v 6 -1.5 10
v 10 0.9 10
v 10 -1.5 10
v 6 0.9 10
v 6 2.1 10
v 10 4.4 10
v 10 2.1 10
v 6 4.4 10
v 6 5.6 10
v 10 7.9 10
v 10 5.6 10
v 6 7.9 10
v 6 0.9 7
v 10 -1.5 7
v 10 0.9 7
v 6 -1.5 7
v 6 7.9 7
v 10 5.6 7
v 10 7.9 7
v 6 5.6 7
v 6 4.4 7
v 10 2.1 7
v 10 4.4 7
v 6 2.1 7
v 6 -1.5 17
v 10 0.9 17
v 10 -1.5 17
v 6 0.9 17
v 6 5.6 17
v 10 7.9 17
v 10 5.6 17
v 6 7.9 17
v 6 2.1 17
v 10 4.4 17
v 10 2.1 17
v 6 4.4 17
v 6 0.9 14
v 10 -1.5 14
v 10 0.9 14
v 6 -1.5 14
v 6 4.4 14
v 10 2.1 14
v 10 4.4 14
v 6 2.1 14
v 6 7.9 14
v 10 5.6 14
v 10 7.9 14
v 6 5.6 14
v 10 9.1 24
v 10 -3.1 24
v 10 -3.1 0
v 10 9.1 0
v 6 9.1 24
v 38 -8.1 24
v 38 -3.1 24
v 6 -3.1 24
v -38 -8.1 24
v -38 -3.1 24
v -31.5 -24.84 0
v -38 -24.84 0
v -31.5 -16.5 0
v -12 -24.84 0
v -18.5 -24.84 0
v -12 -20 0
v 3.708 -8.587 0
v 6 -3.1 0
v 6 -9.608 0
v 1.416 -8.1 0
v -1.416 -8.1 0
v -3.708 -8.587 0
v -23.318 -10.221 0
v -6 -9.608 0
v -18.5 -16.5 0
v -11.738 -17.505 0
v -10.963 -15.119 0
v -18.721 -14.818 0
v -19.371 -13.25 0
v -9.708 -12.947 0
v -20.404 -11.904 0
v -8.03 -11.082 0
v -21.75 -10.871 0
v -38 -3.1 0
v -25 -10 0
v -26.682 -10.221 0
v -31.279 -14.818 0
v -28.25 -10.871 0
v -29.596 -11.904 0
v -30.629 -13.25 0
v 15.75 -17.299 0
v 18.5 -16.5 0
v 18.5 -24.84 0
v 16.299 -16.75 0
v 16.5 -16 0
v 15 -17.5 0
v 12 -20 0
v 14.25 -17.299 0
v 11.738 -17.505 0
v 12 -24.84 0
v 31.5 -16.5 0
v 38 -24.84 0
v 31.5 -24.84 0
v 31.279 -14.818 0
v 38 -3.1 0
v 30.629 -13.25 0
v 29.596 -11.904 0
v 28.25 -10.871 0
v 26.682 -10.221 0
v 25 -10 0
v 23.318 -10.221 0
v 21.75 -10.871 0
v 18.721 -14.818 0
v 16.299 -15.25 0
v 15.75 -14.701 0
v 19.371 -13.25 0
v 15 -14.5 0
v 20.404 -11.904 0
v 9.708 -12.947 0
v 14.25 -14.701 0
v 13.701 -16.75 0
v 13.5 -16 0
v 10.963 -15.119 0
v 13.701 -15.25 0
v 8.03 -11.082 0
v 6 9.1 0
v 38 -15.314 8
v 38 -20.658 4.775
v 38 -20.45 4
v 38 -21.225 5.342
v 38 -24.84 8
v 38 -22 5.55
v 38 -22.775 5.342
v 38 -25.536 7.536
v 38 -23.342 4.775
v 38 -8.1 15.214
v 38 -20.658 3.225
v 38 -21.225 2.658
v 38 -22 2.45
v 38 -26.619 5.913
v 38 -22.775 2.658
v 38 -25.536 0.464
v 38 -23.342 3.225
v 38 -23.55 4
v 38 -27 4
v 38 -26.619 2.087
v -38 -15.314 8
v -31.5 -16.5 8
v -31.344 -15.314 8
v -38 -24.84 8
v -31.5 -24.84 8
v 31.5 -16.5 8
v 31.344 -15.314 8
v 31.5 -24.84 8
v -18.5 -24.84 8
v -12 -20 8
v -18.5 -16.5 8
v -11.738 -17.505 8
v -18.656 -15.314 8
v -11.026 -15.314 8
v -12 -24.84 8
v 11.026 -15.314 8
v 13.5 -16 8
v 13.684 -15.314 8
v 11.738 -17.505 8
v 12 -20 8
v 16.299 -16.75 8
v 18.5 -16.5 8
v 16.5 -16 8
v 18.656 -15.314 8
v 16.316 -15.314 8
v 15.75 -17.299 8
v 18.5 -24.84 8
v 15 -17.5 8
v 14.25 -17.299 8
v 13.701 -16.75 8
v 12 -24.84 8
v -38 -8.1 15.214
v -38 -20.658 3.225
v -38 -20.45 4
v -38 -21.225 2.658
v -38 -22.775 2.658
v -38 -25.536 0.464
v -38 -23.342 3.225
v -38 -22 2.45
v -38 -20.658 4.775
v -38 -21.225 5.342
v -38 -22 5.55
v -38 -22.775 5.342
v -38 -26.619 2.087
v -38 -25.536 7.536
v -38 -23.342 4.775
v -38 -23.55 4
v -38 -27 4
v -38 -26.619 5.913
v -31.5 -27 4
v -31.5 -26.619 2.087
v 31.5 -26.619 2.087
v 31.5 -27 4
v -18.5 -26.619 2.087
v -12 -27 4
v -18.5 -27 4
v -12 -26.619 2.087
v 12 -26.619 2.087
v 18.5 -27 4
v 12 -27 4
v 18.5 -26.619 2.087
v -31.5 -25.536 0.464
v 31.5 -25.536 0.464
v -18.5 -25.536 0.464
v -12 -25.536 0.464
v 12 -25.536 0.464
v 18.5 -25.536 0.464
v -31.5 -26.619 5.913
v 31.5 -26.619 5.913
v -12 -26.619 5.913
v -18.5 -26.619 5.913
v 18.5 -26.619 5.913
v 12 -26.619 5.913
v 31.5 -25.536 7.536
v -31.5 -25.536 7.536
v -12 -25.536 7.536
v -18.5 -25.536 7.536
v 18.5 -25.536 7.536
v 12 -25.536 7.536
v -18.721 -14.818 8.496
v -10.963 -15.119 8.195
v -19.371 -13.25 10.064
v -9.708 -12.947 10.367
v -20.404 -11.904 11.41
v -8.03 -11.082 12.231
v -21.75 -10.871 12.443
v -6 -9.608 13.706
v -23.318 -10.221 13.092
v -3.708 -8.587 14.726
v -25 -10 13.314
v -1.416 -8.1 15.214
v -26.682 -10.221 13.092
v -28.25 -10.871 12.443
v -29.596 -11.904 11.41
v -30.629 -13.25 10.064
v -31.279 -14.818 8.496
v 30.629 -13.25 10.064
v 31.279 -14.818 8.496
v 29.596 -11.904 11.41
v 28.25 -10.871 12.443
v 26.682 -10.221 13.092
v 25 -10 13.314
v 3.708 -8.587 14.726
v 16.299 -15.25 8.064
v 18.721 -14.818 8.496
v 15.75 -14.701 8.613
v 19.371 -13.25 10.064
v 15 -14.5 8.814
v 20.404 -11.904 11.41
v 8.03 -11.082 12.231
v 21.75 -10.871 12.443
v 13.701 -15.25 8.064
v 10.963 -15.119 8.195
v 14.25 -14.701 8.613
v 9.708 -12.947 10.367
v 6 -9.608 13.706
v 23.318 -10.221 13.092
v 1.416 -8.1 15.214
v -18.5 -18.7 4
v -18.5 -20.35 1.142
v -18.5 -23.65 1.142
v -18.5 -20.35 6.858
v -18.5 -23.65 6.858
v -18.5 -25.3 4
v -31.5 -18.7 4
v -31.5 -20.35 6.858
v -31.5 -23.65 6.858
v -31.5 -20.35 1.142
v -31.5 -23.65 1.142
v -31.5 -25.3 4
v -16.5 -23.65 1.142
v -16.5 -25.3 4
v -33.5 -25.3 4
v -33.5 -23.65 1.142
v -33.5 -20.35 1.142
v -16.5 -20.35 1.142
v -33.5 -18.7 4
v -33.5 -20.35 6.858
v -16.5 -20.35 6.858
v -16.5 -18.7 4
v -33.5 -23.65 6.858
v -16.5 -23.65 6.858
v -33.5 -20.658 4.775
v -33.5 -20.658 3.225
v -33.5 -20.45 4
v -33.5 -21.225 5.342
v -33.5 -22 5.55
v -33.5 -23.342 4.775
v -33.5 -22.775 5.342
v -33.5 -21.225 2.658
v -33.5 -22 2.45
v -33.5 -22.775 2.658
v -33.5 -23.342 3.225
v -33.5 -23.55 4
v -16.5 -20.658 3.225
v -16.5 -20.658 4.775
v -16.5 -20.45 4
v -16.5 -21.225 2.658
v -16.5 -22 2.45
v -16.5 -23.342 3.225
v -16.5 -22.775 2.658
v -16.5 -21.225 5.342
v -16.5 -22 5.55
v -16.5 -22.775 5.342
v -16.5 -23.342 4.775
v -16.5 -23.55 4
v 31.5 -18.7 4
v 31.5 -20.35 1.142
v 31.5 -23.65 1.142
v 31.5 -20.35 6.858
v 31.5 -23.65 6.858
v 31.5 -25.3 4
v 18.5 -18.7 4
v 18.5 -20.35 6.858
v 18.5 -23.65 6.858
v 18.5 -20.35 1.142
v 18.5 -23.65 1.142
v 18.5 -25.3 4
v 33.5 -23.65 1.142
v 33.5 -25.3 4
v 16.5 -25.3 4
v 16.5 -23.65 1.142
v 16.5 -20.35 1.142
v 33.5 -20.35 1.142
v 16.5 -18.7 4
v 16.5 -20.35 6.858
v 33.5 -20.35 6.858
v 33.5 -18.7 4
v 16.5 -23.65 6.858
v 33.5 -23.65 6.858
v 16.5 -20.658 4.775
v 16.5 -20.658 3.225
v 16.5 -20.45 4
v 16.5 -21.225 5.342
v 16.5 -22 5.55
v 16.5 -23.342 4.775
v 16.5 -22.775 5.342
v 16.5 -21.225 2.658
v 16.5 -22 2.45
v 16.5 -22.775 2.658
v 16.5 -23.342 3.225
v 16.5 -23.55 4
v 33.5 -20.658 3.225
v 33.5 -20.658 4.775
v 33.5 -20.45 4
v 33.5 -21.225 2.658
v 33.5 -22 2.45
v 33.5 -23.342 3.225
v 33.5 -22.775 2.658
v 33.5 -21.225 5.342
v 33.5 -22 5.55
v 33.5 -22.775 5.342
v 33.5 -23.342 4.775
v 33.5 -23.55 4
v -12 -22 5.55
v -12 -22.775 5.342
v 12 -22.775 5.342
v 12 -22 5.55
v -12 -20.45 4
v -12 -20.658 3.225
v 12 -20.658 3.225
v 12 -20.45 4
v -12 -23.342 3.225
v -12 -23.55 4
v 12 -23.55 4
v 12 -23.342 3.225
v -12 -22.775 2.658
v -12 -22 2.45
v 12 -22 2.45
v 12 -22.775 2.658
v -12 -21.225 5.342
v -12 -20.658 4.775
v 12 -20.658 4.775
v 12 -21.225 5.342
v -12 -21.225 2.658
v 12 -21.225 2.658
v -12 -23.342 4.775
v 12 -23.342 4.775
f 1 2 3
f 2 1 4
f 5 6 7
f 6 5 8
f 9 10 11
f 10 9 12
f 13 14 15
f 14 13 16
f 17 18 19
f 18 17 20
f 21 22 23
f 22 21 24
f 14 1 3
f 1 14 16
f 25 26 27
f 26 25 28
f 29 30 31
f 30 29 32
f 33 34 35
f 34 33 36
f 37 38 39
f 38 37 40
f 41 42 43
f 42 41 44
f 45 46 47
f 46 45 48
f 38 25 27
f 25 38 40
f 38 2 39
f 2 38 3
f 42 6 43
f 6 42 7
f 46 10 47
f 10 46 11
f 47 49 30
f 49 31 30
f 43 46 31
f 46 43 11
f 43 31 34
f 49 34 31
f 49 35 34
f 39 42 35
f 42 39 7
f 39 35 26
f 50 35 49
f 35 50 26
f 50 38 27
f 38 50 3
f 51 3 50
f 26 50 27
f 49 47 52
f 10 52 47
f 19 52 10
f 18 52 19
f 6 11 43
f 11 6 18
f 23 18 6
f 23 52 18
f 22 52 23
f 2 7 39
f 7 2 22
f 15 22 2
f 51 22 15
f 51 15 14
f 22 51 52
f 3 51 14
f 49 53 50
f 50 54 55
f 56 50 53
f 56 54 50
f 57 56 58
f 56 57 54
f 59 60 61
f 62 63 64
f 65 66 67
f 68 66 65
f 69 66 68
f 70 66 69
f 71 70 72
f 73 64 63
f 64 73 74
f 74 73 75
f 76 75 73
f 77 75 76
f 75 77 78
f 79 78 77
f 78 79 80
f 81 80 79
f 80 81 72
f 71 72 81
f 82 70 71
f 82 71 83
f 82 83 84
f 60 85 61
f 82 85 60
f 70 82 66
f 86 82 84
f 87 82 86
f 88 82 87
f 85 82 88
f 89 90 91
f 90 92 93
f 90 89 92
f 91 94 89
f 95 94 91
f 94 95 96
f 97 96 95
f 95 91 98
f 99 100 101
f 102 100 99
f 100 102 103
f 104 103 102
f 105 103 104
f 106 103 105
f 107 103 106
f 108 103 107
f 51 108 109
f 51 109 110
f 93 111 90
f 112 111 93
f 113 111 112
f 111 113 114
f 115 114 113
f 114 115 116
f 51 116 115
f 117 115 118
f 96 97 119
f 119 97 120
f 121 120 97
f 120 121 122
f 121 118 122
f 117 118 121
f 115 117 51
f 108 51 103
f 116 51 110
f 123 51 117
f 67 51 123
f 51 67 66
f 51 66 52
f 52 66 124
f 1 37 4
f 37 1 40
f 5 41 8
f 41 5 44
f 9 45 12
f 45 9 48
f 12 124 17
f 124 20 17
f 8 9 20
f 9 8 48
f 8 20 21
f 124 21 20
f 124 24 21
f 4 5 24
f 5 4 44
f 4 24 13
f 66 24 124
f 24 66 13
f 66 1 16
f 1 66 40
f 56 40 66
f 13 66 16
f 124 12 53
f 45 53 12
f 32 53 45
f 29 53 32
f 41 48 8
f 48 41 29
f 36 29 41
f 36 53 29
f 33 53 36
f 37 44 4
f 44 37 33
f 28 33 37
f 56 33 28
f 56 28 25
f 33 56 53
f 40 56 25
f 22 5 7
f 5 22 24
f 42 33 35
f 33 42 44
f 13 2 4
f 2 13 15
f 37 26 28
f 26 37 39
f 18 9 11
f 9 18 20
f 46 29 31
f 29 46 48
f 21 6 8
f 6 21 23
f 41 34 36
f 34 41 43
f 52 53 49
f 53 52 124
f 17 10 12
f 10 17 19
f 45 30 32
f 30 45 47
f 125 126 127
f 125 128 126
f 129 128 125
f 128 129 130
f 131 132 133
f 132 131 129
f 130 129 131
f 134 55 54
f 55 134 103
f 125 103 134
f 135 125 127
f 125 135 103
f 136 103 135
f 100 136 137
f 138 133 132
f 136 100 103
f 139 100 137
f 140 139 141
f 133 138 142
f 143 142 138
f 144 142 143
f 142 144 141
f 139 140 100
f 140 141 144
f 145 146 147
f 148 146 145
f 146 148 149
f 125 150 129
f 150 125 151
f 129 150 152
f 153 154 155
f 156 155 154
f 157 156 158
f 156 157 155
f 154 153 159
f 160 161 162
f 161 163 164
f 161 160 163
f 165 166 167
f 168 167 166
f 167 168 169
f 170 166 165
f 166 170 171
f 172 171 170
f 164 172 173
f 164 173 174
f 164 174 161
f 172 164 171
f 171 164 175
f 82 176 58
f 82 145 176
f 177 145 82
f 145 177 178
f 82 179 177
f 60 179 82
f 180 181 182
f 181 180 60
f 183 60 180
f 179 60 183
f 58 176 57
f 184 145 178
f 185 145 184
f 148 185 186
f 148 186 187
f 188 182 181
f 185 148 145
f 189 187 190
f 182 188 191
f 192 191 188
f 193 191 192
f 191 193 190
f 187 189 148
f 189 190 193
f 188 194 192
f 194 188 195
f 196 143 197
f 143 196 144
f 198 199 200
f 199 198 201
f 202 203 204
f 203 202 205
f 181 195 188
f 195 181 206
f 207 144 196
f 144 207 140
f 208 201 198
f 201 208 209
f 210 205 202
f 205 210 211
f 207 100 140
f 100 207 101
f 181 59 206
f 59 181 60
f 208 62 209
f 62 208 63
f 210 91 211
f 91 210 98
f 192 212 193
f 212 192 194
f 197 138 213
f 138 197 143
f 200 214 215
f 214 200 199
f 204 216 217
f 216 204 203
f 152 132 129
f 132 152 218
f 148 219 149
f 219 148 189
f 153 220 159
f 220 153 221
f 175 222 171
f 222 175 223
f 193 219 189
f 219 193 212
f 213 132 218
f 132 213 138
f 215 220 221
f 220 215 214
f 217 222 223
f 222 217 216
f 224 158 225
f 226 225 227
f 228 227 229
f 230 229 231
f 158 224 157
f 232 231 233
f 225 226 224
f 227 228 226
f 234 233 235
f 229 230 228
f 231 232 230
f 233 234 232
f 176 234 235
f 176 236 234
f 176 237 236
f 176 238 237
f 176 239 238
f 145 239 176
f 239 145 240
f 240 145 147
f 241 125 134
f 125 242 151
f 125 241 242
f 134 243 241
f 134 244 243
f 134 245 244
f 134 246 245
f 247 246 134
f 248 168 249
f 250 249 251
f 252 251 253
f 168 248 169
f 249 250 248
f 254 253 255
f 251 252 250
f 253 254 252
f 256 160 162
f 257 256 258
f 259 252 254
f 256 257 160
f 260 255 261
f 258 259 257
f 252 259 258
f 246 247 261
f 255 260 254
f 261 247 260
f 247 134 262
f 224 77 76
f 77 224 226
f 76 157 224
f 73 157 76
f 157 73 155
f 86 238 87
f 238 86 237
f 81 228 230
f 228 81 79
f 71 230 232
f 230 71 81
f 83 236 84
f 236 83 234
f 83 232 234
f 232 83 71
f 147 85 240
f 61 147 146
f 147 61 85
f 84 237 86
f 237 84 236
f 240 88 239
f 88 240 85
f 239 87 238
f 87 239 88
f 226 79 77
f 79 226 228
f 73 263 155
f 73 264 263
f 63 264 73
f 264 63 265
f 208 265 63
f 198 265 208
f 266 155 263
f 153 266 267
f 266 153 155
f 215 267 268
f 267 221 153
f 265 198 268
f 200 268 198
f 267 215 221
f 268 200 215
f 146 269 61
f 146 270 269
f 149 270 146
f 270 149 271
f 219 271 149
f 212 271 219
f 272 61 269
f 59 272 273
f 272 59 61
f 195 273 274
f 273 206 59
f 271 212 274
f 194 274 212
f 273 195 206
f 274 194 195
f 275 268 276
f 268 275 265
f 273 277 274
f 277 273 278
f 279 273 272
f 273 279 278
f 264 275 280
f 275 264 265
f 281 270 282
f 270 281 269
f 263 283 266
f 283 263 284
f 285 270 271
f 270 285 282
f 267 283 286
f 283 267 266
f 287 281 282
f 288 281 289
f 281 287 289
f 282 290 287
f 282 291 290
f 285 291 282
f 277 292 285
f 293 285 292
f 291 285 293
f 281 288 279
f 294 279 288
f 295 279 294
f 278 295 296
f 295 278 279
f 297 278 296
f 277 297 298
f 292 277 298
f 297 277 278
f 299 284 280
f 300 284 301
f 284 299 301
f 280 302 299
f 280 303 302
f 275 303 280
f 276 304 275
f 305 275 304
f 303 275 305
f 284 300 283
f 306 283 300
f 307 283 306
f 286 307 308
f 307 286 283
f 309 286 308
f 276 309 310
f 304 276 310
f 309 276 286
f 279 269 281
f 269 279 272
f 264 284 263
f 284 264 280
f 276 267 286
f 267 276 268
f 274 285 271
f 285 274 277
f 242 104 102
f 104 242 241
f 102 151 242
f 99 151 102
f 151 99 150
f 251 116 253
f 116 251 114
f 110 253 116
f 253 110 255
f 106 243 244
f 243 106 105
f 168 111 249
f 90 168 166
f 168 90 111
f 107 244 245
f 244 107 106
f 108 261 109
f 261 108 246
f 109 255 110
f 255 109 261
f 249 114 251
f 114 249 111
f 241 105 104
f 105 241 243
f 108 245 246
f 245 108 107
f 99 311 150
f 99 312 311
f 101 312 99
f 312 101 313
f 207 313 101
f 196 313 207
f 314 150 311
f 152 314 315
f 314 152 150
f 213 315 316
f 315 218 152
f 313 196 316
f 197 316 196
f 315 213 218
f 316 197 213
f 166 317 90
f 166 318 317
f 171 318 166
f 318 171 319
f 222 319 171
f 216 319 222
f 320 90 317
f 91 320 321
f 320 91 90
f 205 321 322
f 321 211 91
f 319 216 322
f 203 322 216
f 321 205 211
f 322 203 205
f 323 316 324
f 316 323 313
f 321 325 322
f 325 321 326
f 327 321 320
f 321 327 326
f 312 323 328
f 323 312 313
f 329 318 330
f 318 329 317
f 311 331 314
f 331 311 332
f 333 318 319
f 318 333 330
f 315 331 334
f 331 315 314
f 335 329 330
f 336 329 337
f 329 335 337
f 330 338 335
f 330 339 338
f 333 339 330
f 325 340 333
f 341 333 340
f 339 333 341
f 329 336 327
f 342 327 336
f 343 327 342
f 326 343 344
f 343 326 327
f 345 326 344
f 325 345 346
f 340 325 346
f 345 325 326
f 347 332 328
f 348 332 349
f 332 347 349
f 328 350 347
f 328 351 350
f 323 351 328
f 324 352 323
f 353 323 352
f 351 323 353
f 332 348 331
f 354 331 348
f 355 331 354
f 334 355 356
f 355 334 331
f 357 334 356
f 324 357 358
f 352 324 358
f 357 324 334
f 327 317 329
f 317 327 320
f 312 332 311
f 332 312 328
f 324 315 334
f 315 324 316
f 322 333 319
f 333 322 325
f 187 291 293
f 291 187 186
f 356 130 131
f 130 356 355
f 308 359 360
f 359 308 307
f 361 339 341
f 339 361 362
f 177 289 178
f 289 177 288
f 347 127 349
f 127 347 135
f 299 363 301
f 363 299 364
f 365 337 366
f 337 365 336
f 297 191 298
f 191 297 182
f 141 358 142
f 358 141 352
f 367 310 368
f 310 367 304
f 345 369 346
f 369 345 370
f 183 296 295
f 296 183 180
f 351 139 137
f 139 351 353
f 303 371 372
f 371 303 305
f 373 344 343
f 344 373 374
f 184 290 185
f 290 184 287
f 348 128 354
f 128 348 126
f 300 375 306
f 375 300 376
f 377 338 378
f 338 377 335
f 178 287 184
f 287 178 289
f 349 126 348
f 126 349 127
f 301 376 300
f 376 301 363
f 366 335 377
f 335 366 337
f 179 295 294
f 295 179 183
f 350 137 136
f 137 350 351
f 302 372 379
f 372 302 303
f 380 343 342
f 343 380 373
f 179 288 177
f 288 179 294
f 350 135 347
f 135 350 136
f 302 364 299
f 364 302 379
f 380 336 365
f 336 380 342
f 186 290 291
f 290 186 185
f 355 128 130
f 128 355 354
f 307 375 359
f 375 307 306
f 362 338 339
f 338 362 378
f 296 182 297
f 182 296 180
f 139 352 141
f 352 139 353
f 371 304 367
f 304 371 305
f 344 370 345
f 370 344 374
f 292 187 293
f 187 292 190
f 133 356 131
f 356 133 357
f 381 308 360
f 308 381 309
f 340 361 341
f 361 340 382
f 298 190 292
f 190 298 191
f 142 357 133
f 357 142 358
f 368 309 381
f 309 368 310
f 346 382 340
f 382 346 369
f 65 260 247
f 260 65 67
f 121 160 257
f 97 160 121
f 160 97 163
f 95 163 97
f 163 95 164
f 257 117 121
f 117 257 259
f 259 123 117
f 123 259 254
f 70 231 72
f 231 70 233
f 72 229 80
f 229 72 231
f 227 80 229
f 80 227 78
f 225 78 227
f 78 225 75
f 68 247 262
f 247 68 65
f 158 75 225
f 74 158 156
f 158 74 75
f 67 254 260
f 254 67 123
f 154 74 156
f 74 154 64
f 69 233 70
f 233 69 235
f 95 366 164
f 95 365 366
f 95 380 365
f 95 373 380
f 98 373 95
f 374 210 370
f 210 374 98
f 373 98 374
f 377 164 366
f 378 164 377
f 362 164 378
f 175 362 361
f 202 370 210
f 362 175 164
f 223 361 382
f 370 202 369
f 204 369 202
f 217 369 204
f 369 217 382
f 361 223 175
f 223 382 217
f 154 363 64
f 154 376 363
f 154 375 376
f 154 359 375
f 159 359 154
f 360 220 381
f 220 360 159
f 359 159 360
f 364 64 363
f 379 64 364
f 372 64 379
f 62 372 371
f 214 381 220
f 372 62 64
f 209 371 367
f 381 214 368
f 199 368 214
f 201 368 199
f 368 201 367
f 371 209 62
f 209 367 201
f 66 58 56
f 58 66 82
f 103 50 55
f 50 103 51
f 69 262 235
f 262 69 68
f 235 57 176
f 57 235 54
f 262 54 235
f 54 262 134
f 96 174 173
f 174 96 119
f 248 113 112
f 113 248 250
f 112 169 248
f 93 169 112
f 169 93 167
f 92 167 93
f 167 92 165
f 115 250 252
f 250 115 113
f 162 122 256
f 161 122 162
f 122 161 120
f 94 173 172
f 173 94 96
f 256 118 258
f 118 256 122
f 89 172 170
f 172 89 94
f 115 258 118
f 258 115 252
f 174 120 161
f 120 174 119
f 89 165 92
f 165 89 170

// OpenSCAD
// file: configuration.scad
motor_end_height=44;
idler_end_height=28;
carriage_height=24;

platform_thickness=8;

sanguinololu=false;					// places mounting holes for the Sanguinololu controller

carbon_rods=true;					// turns on option for carbon diagonal rods just for looks!

frame_thickness=6;   				// 6mm acrylic
pcb_thickness=2;					    // used for rendering PCB and approximating build volume

//smooth_rod_length=495;  			// determins vertical build height with 508 for 8" 
smooth_rod_length=620;  			

rod_diameter=8;						// might be interesting to have larger rods

platform_hinge_offset=33;

carriage_hinge_offset=22;             // default rostock mini platform

// 27 for mini-platform


// printrbed 155,155 for 6x6
//printbed=[155,155];  				
//printbed_screw_spacing=[146.5,147]; 

// prusa 8x8 platform
printbed=[214,214];
printbed_screw_spacing=[209,209];

tower_radius = printbed[0]*0.9;
rod_length=printbed[0]*1.2;

corner_radius=12;

frame_radius=(tower_radius-rod_diameter/2-corner_radius)/cos(30);
// main file
include <configuration.scad>

width = 76;
height = carriage_height;

offset = 25;
cutout = 13;
middle = 2*offset - width/2;

module parallel_joints(reinforced) {
  difference() {
    union() {
      intersection() {
        cube([width, 20, 8], center=true);
        rotate([0, 90, 0]) cylinder(r=5, h=width, center=true);
      }
      intersection() {
        translate([0, 18, 4]) rotate([45, 0, 0])
          cube([width, reinforced, reinforced], center=true);
        translate([0, 0, 20]) cube([width, 35, 40], center=true);
      }
      translate([0, 8, 0]) cube([width, 16, 8], center=true);
    }
    rotate([0, 90, 0]) cylinder(r=1.55, h=80, center=true, $fn=12);

    for (x = [-offset, offset]) {
      translate([x, 5.5, 0])
        cylinder(r=cutout/2, h=100, center=true, $fn=24);
      translate([x, -4.5, 0])
        cube([cutout, 20, 100], center=true);
      translate([x, 0, 0]) rotate([0, 90, 0]) rotate([0, 0, 30])
        cylinder(r=3.3, h=17, center=true, $fn=6);
    }
    translate([0, 2, 0]) cylinder(r=middle, h=100, center=true);
    translate([0, -8, 0]) cube([2*middle, 20, 100], center=true);
  }
}

module lm8uu_mount(d, h) {
  union() {
    difference() {
      intersection() {
        cylinder(r=11, h=h, center=true);
        translate([0, -8, 0]) cube([19, 13, h+1], center=true);
      }
      cylinder(r=d/2, h=h+1, center=true);
    }
  }
}

module belt_mount() {
  difference() {
    union() {
      difference() {
        translate([8, 2, 0]) cube([4, 13, height], center=true);
        for (z = [-3.5, 3.5])
          translate([8, 5, z])
            cube([5, 13, 3], center=true);
      }
      for (y = [1.5, 5, 8.5]) {
        translate([8, y, 0]) cube([4, 1.2, height], center=true);
      }
    }
  }
}

module carriage() {
  translate([0, 0, height/2]) 
  union() {
    //for (x = [-30, 30]) {
    //  translate([x, 0, 0]) lm8uu_mount(d=15, h=24);
    //}
    belt_mount();
    difference() {
      union() {
        // back plate
		translate([0, -5.6, 0])
          cube([width, 5, height], center=true); // was 50
        
		translate([0, -carriage_hinge_offset, -height/2+4])
          parallel_joints(16);
      }

      // Screw hole for adjustable top endstop.
      translate([15, -16, -height/2+4])
        cylinder(r=1.5, h=20, center=true, $fn=12);

      //for (x = [-30, 30]) {
        //translate([x, 0, 0])
        //  cylinder(r=8, h=height+1, center=true);
        // Zip tie tunnels.
        ///for (z = [-height/2+4, height/2-4])
        ///  translate([x, 0, z])
        ///    cylinder(r=13, h=3, center=true);
      //}
    }
  }
}

carriage();

// Uncomment the following lines to check endstop alignment.
// use <idler_end.scad>;
// translate([0, 0, -20]) rotate([180, 0, 0]) idler_end();
